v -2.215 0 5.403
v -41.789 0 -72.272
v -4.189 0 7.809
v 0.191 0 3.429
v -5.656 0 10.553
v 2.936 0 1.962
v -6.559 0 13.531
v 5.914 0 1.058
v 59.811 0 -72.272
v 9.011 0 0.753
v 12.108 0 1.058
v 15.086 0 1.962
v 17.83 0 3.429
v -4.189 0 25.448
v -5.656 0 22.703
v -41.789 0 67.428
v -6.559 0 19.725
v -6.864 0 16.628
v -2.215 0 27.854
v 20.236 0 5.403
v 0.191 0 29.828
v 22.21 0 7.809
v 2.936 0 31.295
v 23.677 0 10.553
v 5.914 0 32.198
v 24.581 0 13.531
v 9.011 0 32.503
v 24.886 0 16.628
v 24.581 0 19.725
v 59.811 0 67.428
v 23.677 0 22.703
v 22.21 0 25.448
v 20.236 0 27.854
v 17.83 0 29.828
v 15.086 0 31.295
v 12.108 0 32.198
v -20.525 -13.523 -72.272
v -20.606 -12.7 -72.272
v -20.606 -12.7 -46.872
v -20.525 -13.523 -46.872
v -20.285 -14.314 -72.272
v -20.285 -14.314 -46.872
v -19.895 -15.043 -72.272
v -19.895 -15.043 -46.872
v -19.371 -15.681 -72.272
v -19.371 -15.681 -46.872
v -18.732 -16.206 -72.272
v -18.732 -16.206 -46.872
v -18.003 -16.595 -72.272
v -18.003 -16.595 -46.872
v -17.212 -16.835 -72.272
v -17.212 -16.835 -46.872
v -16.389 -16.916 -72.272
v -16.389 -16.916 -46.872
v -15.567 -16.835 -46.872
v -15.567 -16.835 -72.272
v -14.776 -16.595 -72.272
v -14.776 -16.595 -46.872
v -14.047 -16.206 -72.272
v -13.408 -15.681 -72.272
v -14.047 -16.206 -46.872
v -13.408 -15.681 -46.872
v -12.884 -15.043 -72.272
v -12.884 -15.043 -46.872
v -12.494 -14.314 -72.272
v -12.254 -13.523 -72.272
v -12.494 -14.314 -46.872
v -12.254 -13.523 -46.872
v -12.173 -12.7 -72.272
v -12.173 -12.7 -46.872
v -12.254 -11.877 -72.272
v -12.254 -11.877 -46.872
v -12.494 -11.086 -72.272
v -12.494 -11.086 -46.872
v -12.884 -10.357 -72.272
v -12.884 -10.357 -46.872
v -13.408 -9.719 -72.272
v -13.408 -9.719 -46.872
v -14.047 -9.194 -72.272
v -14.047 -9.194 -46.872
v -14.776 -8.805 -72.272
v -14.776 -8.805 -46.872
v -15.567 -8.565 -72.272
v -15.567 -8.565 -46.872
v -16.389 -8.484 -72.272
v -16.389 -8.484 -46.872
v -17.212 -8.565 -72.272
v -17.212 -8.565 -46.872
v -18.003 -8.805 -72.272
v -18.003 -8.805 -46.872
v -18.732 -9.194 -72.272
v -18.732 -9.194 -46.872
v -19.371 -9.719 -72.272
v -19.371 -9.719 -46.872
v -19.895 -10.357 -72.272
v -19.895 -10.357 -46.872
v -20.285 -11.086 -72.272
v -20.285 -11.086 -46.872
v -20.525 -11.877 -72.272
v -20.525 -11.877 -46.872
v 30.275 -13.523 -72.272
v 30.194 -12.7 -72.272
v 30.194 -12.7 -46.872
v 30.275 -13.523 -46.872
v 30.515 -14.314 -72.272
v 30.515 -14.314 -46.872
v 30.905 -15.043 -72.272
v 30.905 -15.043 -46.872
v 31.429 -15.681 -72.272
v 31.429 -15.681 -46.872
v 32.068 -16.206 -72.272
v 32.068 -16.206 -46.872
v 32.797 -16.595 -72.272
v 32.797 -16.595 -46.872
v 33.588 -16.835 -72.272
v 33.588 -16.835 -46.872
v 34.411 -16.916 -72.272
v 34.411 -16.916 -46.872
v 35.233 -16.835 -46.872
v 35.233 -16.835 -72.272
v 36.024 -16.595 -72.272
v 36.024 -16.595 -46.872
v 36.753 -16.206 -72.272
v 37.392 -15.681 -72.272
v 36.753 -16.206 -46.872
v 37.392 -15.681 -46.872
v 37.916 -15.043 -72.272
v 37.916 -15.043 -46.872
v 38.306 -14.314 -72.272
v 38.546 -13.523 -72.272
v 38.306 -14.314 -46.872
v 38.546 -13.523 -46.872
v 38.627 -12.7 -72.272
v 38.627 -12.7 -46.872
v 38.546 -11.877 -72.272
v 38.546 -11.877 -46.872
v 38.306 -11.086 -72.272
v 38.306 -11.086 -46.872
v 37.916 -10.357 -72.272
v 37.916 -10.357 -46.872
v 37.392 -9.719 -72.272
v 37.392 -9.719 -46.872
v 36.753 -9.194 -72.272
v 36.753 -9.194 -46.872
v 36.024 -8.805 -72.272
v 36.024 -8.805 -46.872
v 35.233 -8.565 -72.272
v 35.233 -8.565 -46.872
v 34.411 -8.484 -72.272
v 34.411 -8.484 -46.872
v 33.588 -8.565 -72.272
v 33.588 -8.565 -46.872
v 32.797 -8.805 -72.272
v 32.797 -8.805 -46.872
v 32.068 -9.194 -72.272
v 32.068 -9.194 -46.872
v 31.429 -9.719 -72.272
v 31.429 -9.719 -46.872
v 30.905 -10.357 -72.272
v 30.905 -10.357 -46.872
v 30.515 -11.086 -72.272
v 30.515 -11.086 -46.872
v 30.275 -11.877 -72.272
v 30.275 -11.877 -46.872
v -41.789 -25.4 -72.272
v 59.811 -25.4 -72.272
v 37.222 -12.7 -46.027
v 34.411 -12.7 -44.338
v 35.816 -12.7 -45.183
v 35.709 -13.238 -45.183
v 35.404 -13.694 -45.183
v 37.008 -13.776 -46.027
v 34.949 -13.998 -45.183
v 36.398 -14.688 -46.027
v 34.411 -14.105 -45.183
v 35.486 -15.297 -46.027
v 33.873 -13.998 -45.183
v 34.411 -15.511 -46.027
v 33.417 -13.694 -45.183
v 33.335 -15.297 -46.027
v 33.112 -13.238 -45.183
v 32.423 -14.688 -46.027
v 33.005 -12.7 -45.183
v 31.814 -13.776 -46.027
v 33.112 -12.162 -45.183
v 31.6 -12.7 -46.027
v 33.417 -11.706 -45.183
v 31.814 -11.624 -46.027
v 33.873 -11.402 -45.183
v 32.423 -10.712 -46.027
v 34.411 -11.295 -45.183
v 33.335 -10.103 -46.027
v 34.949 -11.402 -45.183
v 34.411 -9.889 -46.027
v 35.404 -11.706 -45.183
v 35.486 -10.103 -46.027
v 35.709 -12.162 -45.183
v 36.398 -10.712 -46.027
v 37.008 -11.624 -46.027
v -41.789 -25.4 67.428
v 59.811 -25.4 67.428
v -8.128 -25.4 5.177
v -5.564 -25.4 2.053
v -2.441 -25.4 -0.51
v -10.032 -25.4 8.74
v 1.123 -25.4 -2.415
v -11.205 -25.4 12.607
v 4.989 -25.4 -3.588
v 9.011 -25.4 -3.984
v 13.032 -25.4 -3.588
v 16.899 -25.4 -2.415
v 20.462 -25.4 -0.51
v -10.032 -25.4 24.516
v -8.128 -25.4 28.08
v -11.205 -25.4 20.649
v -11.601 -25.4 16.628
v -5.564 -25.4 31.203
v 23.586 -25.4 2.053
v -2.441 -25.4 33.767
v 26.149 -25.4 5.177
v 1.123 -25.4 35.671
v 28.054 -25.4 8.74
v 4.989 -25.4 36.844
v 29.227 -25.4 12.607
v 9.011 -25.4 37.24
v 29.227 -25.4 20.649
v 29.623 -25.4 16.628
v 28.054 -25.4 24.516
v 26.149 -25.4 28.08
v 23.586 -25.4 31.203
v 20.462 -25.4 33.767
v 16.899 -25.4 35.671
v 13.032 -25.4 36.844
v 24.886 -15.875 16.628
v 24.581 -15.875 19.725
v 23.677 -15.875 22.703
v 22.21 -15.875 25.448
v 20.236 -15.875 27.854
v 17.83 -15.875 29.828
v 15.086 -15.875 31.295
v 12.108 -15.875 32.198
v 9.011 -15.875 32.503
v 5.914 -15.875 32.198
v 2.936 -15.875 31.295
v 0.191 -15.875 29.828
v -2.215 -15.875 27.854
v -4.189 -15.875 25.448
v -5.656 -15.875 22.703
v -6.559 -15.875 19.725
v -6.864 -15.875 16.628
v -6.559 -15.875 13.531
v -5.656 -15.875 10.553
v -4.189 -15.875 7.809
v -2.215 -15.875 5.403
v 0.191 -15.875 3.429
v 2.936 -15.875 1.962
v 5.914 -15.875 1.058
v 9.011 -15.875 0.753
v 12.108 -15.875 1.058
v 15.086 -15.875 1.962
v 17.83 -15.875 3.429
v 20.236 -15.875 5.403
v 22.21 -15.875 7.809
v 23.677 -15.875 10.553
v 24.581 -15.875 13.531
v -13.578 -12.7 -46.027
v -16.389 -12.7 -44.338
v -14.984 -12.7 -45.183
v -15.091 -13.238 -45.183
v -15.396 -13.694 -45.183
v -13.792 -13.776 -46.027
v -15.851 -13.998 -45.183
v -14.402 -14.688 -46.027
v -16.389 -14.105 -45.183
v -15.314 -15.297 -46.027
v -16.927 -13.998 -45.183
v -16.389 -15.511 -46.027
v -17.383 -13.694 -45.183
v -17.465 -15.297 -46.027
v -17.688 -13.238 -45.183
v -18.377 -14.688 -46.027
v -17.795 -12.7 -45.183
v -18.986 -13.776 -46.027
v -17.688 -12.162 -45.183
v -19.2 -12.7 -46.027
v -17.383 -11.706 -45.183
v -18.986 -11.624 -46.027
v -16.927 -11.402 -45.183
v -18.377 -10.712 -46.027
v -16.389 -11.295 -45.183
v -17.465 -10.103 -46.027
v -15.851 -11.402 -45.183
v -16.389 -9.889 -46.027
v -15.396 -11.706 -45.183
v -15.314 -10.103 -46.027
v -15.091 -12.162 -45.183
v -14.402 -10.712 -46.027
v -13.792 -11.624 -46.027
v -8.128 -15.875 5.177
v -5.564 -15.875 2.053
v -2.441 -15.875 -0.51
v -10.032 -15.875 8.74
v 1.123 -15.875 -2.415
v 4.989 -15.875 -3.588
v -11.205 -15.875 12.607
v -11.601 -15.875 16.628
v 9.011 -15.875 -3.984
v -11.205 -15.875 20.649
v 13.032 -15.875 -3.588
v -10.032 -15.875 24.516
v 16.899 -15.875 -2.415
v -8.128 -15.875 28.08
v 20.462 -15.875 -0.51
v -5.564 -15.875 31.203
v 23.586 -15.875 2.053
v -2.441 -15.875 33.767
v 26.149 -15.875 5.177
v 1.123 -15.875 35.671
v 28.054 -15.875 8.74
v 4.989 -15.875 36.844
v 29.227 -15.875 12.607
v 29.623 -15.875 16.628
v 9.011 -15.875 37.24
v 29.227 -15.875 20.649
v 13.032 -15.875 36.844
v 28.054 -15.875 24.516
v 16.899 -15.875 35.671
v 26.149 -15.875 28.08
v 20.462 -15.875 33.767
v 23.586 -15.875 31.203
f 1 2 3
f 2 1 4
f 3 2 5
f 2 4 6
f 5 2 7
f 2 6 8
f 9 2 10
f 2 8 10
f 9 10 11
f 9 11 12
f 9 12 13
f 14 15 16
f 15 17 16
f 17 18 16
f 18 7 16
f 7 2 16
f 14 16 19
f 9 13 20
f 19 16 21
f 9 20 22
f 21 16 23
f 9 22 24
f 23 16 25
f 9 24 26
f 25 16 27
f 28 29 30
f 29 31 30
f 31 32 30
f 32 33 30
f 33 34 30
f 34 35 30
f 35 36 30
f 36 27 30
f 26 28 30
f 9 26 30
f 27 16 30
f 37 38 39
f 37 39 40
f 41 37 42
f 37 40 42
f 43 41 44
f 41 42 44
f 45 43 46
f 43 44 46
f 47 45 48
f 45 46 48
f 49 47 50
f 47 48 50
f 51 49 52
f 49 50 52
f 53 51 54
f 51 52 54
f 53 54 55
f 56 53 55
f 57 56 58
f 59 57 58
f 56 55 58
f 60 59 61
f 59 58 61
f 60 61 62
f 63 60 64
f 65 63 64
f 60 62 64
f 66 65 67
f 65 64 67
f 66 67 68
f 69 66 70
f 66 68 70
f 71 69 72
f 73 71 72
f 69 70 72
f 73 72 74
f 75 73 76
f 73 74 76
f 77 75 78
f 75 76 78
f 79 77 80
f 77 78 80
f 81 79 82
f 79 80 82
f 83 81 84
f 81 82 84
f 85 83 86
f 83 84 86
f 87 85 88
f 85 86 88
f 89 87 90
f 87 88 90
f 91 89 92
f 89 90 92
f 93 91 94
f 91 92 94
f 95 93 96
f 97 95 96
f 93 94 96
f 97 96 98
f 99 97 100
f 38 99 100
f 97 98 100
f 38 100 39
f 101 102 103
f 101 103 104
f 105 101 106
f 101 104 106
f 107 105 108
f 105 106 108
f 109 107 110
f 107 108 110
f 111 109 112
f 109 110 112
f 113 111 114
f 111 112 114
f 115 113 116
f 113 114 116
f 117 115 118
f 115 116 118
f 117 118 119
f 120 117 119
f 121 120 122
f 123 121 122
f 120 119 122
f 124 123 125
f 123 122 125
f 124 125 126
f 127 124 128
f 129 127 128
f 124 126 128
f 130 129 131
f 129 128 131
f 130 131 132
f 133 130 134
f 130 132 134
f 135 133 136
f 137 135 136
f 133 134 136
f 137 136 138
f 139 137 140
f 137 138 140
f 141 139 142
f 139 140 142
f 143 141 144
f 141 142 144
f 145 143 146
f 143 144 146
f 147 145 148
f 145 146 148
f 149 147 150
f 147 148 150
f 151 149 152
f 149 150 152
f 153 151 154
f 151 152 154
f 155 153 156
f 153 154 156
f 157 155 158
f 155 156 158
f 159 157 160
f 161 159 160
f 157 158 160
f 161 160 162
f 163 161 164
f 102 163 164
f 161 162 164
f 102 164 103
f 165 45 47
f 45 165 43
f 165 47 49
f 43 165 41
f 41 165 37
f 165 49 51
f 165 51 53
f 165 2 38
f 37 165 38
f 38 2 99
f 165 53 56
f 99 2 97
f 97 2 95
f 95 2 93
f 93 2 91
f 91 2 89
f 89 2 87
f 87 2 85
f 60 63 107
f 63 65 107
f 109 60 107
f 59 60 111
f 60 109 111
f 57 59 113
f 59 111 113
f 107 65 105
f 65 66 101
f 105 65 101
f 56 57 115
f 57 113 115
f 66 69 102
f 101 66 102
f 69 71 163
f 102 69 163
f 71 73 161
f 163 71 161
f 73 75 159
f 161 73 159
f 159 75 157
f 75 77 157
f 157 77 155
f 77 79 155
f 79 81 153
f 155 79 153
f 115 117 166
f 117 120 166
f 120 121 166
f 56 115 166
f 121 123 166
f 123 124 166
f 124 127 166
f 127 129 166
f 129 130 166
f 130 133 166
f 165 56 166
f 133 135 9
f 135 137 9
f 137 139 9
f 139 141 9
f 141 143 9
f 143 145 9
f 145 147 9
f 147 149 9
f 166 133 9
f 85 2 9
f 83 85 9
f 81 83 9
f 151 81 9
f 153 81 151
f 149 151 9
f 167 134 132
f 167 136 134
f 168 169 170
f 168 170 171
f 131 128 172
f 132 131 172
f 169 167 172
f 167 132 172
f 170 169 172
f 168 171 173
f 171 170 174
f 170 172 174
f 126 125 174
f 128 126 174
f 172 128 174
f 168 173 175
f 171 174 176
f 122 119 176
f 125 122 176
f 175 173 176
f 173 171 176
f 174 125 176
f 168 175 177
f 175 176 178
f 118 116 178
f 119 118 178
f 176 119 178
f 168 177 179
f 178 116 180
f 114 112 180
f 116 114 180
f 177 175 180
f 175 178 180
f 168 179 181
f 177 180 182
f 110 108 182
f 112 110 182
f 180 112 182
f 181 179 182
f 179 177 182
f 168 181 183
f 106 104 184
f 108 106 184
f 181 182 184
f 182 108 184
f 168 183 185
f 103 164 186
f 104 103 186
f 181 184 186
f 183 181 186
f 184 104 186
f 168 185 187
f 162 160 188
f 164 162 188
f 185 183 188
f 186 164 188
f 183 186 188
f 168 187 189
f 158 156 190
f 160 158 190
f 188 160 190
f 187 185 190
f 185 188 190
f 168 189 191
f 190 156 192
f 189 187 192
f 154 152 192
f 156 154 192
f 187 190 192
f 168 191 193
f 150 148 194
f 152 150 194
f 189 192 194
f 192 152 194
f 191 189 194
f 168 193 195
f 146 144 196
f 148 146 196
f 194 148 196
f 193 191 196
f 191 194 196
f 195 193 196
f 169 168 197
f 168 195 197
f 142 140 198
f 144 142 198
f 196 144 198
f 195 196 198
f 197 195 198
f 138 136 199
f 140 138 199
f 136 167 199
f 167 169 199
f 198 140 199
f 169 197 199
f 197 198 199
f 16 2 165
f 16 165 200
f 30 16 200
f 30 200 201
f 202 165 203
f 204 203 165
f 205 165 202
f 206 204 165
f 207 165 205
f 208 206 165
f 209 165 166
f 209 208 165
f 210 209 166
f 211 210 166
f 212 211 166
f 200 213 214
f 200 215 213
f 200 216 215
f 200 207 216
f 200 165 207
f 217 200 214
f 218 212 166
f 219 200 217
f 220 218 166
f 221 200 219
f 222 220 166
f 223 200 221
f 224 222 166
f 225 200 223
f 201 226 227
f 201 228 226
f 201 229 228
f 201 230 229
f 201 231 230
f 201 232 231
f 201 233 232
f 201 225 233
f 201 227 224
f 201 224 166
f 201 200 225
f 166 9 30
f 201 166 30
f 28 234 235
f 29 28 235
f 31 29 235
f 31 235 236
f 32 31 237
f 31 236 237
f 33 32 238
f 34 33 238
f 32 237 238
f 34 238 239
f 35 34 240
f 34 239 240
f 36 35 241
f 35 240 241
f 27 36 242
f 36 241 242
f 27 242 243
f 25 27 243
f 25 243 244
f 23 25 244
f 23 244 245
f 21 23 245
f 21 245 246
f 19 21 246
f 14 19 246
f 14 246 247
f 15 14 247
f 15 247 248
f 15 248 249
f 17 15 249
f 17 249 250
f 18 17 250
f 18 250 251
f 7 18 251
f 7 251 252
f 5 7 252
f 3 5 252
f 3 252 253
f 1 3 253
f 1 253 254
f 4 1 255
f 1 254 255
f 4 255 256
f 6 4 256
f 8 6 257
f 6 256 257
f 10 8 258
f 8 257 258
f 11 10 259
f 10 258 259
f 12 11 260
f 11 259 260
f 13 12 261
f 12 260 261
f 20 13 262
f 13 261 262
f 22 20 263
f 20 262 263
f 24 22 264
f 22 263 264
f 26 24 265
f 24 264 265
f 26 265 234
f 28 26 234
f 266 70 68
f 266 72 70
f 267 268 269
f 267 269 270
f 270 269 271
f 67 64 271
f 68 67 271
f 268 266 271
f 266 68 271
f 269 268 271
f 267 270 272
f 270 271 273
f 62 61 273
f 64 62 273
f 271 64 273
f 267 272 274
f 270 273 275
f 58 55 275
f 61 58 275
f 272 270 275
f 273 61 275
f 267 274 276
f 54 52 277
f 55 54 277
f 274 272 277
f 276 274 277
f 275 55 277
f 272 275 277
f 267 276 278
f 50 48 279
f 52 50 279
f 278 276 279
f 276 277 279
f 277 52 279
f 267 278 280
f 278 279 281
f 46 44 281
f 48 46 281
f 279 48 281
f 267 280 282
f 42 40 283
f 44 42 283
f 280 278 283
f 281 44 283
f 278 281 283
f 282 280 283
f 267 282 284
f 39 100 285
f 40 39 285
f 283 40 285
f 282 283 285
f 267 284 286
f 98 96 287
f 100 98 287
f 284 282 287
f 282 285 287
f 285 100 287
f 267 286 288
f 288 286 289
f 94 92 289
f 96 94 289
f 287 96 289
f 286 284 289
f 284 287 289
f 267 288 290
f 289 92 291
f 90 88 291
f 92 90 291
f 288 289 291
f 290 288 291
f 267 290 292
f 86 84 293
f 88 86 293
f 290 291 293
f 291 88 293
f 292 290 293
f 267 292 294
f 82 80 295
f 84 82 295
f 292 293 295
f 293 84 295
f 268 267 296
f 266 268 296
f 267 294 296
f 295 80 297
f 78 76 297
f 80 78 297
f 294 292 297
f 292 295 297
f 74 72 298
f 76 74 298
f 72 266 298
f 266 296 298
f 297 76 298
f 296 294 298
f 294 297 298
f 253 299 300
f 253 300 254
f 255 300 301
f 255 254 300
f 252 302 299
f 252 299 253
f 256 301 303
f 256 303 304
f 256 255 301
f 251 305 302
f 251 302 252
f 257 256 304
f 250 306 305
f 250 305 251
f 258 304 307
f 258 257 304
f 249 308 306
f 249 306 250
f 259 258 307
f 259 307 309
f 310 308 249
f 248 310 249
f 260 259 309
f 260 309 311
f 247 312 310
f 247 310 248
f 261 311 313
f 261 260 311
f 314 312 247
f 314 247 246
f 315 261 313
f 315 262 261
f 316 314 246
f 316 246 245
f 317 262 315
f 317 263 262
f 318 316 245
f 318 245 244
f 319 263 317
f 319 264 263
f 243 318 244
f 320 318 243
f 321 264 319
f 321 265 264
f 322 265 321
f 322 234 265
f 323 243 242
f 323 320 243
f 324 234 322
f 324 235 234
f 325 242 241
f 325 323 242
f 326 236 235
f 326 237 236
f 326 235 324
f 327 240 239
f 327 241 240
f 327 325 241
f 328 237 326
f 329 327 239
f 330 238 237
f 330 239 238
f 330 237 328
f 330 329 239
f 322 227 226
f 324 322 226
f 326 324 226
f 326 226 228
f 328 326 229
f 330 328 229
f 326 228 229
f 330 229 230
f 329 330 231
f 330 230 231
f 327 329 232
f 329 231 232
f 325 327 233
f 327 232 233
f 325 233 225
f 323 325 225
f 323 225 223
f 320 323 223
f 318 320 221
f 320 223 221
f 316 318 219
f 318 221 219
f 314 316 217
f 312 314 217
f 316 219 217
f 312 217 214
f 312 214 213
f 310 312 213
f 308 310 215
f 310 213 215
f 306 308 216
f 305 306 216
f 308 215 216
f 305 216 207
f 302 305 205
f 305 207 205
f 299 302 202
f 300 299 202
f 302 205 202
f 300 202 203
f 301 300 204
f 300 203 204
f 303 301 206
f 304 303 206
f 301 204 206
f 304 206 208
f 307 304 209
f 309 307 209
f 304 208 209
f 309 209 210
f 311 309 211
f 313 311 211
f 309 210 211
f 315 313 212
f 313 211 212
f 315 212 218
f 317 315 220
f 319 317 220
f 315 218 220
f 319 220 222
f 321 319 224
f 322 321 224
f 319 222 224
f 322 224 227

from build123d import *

# Parameters (mm, degrees)
F0_W     = 101.6
F0_H     = 139.7
F1_DEPTH = 25.4
F3_D     = 8.4328
F3_DEPTH = 25.4
F3_TIP   = 2.5334687141
F4_R     = 20.6121
F5_DEPTH = 9.525
F6_R     = 15.875
F7_DEPTH = 25.4


with BuildPart() as f1:
    # F0 (on Front) → F1 (new body)
    with BuildSketch(Plane.XZ):
        with Locations((9.0106602939, -2.4217218161)):
            Rectangle(F0_W, F0_H)
    extrude(amount=F1_DEPTH)

    # F3
    with Locations(Plane(origin=(0, 0, -72.2717218161), x_dir=(1, 0, 0), z_dir=(0, 0, -1))):
        with Locations((-16.3893397061, 12.7), (34.4106602939, 12.7)):
            Hole(F3_D / 2, depth=F3_DEPTH)
            with Locations((0, 0, -(F3_DEPTH + F3_TIP / 2))):  # 118° drill point
                Cone(0, F3_D / 2, F3_TIP, mode=Mode.SUBTRACT)

    # F4 (on face) → F5 (cut)
    with BuildSketch(Plane.XZ.offset(25.4)):
        with Locations((9.0106602939, 16.6282781839)):
            Circle(F4_R)
    extrude(amount=-F5_DEPTH, mode=Mode.SUBTRACT)

    # F6 (on face) → F7 (cut)
    with BuildSketch(Plane.XZ.offset(15.875)):
        with Locations((9.0106602939, 16.6282781839)):
            Circle(F6_R)
    extrude(amount=-F7_DEPTH, mode=Mode.SUBTRACT)


solid = f1.part
